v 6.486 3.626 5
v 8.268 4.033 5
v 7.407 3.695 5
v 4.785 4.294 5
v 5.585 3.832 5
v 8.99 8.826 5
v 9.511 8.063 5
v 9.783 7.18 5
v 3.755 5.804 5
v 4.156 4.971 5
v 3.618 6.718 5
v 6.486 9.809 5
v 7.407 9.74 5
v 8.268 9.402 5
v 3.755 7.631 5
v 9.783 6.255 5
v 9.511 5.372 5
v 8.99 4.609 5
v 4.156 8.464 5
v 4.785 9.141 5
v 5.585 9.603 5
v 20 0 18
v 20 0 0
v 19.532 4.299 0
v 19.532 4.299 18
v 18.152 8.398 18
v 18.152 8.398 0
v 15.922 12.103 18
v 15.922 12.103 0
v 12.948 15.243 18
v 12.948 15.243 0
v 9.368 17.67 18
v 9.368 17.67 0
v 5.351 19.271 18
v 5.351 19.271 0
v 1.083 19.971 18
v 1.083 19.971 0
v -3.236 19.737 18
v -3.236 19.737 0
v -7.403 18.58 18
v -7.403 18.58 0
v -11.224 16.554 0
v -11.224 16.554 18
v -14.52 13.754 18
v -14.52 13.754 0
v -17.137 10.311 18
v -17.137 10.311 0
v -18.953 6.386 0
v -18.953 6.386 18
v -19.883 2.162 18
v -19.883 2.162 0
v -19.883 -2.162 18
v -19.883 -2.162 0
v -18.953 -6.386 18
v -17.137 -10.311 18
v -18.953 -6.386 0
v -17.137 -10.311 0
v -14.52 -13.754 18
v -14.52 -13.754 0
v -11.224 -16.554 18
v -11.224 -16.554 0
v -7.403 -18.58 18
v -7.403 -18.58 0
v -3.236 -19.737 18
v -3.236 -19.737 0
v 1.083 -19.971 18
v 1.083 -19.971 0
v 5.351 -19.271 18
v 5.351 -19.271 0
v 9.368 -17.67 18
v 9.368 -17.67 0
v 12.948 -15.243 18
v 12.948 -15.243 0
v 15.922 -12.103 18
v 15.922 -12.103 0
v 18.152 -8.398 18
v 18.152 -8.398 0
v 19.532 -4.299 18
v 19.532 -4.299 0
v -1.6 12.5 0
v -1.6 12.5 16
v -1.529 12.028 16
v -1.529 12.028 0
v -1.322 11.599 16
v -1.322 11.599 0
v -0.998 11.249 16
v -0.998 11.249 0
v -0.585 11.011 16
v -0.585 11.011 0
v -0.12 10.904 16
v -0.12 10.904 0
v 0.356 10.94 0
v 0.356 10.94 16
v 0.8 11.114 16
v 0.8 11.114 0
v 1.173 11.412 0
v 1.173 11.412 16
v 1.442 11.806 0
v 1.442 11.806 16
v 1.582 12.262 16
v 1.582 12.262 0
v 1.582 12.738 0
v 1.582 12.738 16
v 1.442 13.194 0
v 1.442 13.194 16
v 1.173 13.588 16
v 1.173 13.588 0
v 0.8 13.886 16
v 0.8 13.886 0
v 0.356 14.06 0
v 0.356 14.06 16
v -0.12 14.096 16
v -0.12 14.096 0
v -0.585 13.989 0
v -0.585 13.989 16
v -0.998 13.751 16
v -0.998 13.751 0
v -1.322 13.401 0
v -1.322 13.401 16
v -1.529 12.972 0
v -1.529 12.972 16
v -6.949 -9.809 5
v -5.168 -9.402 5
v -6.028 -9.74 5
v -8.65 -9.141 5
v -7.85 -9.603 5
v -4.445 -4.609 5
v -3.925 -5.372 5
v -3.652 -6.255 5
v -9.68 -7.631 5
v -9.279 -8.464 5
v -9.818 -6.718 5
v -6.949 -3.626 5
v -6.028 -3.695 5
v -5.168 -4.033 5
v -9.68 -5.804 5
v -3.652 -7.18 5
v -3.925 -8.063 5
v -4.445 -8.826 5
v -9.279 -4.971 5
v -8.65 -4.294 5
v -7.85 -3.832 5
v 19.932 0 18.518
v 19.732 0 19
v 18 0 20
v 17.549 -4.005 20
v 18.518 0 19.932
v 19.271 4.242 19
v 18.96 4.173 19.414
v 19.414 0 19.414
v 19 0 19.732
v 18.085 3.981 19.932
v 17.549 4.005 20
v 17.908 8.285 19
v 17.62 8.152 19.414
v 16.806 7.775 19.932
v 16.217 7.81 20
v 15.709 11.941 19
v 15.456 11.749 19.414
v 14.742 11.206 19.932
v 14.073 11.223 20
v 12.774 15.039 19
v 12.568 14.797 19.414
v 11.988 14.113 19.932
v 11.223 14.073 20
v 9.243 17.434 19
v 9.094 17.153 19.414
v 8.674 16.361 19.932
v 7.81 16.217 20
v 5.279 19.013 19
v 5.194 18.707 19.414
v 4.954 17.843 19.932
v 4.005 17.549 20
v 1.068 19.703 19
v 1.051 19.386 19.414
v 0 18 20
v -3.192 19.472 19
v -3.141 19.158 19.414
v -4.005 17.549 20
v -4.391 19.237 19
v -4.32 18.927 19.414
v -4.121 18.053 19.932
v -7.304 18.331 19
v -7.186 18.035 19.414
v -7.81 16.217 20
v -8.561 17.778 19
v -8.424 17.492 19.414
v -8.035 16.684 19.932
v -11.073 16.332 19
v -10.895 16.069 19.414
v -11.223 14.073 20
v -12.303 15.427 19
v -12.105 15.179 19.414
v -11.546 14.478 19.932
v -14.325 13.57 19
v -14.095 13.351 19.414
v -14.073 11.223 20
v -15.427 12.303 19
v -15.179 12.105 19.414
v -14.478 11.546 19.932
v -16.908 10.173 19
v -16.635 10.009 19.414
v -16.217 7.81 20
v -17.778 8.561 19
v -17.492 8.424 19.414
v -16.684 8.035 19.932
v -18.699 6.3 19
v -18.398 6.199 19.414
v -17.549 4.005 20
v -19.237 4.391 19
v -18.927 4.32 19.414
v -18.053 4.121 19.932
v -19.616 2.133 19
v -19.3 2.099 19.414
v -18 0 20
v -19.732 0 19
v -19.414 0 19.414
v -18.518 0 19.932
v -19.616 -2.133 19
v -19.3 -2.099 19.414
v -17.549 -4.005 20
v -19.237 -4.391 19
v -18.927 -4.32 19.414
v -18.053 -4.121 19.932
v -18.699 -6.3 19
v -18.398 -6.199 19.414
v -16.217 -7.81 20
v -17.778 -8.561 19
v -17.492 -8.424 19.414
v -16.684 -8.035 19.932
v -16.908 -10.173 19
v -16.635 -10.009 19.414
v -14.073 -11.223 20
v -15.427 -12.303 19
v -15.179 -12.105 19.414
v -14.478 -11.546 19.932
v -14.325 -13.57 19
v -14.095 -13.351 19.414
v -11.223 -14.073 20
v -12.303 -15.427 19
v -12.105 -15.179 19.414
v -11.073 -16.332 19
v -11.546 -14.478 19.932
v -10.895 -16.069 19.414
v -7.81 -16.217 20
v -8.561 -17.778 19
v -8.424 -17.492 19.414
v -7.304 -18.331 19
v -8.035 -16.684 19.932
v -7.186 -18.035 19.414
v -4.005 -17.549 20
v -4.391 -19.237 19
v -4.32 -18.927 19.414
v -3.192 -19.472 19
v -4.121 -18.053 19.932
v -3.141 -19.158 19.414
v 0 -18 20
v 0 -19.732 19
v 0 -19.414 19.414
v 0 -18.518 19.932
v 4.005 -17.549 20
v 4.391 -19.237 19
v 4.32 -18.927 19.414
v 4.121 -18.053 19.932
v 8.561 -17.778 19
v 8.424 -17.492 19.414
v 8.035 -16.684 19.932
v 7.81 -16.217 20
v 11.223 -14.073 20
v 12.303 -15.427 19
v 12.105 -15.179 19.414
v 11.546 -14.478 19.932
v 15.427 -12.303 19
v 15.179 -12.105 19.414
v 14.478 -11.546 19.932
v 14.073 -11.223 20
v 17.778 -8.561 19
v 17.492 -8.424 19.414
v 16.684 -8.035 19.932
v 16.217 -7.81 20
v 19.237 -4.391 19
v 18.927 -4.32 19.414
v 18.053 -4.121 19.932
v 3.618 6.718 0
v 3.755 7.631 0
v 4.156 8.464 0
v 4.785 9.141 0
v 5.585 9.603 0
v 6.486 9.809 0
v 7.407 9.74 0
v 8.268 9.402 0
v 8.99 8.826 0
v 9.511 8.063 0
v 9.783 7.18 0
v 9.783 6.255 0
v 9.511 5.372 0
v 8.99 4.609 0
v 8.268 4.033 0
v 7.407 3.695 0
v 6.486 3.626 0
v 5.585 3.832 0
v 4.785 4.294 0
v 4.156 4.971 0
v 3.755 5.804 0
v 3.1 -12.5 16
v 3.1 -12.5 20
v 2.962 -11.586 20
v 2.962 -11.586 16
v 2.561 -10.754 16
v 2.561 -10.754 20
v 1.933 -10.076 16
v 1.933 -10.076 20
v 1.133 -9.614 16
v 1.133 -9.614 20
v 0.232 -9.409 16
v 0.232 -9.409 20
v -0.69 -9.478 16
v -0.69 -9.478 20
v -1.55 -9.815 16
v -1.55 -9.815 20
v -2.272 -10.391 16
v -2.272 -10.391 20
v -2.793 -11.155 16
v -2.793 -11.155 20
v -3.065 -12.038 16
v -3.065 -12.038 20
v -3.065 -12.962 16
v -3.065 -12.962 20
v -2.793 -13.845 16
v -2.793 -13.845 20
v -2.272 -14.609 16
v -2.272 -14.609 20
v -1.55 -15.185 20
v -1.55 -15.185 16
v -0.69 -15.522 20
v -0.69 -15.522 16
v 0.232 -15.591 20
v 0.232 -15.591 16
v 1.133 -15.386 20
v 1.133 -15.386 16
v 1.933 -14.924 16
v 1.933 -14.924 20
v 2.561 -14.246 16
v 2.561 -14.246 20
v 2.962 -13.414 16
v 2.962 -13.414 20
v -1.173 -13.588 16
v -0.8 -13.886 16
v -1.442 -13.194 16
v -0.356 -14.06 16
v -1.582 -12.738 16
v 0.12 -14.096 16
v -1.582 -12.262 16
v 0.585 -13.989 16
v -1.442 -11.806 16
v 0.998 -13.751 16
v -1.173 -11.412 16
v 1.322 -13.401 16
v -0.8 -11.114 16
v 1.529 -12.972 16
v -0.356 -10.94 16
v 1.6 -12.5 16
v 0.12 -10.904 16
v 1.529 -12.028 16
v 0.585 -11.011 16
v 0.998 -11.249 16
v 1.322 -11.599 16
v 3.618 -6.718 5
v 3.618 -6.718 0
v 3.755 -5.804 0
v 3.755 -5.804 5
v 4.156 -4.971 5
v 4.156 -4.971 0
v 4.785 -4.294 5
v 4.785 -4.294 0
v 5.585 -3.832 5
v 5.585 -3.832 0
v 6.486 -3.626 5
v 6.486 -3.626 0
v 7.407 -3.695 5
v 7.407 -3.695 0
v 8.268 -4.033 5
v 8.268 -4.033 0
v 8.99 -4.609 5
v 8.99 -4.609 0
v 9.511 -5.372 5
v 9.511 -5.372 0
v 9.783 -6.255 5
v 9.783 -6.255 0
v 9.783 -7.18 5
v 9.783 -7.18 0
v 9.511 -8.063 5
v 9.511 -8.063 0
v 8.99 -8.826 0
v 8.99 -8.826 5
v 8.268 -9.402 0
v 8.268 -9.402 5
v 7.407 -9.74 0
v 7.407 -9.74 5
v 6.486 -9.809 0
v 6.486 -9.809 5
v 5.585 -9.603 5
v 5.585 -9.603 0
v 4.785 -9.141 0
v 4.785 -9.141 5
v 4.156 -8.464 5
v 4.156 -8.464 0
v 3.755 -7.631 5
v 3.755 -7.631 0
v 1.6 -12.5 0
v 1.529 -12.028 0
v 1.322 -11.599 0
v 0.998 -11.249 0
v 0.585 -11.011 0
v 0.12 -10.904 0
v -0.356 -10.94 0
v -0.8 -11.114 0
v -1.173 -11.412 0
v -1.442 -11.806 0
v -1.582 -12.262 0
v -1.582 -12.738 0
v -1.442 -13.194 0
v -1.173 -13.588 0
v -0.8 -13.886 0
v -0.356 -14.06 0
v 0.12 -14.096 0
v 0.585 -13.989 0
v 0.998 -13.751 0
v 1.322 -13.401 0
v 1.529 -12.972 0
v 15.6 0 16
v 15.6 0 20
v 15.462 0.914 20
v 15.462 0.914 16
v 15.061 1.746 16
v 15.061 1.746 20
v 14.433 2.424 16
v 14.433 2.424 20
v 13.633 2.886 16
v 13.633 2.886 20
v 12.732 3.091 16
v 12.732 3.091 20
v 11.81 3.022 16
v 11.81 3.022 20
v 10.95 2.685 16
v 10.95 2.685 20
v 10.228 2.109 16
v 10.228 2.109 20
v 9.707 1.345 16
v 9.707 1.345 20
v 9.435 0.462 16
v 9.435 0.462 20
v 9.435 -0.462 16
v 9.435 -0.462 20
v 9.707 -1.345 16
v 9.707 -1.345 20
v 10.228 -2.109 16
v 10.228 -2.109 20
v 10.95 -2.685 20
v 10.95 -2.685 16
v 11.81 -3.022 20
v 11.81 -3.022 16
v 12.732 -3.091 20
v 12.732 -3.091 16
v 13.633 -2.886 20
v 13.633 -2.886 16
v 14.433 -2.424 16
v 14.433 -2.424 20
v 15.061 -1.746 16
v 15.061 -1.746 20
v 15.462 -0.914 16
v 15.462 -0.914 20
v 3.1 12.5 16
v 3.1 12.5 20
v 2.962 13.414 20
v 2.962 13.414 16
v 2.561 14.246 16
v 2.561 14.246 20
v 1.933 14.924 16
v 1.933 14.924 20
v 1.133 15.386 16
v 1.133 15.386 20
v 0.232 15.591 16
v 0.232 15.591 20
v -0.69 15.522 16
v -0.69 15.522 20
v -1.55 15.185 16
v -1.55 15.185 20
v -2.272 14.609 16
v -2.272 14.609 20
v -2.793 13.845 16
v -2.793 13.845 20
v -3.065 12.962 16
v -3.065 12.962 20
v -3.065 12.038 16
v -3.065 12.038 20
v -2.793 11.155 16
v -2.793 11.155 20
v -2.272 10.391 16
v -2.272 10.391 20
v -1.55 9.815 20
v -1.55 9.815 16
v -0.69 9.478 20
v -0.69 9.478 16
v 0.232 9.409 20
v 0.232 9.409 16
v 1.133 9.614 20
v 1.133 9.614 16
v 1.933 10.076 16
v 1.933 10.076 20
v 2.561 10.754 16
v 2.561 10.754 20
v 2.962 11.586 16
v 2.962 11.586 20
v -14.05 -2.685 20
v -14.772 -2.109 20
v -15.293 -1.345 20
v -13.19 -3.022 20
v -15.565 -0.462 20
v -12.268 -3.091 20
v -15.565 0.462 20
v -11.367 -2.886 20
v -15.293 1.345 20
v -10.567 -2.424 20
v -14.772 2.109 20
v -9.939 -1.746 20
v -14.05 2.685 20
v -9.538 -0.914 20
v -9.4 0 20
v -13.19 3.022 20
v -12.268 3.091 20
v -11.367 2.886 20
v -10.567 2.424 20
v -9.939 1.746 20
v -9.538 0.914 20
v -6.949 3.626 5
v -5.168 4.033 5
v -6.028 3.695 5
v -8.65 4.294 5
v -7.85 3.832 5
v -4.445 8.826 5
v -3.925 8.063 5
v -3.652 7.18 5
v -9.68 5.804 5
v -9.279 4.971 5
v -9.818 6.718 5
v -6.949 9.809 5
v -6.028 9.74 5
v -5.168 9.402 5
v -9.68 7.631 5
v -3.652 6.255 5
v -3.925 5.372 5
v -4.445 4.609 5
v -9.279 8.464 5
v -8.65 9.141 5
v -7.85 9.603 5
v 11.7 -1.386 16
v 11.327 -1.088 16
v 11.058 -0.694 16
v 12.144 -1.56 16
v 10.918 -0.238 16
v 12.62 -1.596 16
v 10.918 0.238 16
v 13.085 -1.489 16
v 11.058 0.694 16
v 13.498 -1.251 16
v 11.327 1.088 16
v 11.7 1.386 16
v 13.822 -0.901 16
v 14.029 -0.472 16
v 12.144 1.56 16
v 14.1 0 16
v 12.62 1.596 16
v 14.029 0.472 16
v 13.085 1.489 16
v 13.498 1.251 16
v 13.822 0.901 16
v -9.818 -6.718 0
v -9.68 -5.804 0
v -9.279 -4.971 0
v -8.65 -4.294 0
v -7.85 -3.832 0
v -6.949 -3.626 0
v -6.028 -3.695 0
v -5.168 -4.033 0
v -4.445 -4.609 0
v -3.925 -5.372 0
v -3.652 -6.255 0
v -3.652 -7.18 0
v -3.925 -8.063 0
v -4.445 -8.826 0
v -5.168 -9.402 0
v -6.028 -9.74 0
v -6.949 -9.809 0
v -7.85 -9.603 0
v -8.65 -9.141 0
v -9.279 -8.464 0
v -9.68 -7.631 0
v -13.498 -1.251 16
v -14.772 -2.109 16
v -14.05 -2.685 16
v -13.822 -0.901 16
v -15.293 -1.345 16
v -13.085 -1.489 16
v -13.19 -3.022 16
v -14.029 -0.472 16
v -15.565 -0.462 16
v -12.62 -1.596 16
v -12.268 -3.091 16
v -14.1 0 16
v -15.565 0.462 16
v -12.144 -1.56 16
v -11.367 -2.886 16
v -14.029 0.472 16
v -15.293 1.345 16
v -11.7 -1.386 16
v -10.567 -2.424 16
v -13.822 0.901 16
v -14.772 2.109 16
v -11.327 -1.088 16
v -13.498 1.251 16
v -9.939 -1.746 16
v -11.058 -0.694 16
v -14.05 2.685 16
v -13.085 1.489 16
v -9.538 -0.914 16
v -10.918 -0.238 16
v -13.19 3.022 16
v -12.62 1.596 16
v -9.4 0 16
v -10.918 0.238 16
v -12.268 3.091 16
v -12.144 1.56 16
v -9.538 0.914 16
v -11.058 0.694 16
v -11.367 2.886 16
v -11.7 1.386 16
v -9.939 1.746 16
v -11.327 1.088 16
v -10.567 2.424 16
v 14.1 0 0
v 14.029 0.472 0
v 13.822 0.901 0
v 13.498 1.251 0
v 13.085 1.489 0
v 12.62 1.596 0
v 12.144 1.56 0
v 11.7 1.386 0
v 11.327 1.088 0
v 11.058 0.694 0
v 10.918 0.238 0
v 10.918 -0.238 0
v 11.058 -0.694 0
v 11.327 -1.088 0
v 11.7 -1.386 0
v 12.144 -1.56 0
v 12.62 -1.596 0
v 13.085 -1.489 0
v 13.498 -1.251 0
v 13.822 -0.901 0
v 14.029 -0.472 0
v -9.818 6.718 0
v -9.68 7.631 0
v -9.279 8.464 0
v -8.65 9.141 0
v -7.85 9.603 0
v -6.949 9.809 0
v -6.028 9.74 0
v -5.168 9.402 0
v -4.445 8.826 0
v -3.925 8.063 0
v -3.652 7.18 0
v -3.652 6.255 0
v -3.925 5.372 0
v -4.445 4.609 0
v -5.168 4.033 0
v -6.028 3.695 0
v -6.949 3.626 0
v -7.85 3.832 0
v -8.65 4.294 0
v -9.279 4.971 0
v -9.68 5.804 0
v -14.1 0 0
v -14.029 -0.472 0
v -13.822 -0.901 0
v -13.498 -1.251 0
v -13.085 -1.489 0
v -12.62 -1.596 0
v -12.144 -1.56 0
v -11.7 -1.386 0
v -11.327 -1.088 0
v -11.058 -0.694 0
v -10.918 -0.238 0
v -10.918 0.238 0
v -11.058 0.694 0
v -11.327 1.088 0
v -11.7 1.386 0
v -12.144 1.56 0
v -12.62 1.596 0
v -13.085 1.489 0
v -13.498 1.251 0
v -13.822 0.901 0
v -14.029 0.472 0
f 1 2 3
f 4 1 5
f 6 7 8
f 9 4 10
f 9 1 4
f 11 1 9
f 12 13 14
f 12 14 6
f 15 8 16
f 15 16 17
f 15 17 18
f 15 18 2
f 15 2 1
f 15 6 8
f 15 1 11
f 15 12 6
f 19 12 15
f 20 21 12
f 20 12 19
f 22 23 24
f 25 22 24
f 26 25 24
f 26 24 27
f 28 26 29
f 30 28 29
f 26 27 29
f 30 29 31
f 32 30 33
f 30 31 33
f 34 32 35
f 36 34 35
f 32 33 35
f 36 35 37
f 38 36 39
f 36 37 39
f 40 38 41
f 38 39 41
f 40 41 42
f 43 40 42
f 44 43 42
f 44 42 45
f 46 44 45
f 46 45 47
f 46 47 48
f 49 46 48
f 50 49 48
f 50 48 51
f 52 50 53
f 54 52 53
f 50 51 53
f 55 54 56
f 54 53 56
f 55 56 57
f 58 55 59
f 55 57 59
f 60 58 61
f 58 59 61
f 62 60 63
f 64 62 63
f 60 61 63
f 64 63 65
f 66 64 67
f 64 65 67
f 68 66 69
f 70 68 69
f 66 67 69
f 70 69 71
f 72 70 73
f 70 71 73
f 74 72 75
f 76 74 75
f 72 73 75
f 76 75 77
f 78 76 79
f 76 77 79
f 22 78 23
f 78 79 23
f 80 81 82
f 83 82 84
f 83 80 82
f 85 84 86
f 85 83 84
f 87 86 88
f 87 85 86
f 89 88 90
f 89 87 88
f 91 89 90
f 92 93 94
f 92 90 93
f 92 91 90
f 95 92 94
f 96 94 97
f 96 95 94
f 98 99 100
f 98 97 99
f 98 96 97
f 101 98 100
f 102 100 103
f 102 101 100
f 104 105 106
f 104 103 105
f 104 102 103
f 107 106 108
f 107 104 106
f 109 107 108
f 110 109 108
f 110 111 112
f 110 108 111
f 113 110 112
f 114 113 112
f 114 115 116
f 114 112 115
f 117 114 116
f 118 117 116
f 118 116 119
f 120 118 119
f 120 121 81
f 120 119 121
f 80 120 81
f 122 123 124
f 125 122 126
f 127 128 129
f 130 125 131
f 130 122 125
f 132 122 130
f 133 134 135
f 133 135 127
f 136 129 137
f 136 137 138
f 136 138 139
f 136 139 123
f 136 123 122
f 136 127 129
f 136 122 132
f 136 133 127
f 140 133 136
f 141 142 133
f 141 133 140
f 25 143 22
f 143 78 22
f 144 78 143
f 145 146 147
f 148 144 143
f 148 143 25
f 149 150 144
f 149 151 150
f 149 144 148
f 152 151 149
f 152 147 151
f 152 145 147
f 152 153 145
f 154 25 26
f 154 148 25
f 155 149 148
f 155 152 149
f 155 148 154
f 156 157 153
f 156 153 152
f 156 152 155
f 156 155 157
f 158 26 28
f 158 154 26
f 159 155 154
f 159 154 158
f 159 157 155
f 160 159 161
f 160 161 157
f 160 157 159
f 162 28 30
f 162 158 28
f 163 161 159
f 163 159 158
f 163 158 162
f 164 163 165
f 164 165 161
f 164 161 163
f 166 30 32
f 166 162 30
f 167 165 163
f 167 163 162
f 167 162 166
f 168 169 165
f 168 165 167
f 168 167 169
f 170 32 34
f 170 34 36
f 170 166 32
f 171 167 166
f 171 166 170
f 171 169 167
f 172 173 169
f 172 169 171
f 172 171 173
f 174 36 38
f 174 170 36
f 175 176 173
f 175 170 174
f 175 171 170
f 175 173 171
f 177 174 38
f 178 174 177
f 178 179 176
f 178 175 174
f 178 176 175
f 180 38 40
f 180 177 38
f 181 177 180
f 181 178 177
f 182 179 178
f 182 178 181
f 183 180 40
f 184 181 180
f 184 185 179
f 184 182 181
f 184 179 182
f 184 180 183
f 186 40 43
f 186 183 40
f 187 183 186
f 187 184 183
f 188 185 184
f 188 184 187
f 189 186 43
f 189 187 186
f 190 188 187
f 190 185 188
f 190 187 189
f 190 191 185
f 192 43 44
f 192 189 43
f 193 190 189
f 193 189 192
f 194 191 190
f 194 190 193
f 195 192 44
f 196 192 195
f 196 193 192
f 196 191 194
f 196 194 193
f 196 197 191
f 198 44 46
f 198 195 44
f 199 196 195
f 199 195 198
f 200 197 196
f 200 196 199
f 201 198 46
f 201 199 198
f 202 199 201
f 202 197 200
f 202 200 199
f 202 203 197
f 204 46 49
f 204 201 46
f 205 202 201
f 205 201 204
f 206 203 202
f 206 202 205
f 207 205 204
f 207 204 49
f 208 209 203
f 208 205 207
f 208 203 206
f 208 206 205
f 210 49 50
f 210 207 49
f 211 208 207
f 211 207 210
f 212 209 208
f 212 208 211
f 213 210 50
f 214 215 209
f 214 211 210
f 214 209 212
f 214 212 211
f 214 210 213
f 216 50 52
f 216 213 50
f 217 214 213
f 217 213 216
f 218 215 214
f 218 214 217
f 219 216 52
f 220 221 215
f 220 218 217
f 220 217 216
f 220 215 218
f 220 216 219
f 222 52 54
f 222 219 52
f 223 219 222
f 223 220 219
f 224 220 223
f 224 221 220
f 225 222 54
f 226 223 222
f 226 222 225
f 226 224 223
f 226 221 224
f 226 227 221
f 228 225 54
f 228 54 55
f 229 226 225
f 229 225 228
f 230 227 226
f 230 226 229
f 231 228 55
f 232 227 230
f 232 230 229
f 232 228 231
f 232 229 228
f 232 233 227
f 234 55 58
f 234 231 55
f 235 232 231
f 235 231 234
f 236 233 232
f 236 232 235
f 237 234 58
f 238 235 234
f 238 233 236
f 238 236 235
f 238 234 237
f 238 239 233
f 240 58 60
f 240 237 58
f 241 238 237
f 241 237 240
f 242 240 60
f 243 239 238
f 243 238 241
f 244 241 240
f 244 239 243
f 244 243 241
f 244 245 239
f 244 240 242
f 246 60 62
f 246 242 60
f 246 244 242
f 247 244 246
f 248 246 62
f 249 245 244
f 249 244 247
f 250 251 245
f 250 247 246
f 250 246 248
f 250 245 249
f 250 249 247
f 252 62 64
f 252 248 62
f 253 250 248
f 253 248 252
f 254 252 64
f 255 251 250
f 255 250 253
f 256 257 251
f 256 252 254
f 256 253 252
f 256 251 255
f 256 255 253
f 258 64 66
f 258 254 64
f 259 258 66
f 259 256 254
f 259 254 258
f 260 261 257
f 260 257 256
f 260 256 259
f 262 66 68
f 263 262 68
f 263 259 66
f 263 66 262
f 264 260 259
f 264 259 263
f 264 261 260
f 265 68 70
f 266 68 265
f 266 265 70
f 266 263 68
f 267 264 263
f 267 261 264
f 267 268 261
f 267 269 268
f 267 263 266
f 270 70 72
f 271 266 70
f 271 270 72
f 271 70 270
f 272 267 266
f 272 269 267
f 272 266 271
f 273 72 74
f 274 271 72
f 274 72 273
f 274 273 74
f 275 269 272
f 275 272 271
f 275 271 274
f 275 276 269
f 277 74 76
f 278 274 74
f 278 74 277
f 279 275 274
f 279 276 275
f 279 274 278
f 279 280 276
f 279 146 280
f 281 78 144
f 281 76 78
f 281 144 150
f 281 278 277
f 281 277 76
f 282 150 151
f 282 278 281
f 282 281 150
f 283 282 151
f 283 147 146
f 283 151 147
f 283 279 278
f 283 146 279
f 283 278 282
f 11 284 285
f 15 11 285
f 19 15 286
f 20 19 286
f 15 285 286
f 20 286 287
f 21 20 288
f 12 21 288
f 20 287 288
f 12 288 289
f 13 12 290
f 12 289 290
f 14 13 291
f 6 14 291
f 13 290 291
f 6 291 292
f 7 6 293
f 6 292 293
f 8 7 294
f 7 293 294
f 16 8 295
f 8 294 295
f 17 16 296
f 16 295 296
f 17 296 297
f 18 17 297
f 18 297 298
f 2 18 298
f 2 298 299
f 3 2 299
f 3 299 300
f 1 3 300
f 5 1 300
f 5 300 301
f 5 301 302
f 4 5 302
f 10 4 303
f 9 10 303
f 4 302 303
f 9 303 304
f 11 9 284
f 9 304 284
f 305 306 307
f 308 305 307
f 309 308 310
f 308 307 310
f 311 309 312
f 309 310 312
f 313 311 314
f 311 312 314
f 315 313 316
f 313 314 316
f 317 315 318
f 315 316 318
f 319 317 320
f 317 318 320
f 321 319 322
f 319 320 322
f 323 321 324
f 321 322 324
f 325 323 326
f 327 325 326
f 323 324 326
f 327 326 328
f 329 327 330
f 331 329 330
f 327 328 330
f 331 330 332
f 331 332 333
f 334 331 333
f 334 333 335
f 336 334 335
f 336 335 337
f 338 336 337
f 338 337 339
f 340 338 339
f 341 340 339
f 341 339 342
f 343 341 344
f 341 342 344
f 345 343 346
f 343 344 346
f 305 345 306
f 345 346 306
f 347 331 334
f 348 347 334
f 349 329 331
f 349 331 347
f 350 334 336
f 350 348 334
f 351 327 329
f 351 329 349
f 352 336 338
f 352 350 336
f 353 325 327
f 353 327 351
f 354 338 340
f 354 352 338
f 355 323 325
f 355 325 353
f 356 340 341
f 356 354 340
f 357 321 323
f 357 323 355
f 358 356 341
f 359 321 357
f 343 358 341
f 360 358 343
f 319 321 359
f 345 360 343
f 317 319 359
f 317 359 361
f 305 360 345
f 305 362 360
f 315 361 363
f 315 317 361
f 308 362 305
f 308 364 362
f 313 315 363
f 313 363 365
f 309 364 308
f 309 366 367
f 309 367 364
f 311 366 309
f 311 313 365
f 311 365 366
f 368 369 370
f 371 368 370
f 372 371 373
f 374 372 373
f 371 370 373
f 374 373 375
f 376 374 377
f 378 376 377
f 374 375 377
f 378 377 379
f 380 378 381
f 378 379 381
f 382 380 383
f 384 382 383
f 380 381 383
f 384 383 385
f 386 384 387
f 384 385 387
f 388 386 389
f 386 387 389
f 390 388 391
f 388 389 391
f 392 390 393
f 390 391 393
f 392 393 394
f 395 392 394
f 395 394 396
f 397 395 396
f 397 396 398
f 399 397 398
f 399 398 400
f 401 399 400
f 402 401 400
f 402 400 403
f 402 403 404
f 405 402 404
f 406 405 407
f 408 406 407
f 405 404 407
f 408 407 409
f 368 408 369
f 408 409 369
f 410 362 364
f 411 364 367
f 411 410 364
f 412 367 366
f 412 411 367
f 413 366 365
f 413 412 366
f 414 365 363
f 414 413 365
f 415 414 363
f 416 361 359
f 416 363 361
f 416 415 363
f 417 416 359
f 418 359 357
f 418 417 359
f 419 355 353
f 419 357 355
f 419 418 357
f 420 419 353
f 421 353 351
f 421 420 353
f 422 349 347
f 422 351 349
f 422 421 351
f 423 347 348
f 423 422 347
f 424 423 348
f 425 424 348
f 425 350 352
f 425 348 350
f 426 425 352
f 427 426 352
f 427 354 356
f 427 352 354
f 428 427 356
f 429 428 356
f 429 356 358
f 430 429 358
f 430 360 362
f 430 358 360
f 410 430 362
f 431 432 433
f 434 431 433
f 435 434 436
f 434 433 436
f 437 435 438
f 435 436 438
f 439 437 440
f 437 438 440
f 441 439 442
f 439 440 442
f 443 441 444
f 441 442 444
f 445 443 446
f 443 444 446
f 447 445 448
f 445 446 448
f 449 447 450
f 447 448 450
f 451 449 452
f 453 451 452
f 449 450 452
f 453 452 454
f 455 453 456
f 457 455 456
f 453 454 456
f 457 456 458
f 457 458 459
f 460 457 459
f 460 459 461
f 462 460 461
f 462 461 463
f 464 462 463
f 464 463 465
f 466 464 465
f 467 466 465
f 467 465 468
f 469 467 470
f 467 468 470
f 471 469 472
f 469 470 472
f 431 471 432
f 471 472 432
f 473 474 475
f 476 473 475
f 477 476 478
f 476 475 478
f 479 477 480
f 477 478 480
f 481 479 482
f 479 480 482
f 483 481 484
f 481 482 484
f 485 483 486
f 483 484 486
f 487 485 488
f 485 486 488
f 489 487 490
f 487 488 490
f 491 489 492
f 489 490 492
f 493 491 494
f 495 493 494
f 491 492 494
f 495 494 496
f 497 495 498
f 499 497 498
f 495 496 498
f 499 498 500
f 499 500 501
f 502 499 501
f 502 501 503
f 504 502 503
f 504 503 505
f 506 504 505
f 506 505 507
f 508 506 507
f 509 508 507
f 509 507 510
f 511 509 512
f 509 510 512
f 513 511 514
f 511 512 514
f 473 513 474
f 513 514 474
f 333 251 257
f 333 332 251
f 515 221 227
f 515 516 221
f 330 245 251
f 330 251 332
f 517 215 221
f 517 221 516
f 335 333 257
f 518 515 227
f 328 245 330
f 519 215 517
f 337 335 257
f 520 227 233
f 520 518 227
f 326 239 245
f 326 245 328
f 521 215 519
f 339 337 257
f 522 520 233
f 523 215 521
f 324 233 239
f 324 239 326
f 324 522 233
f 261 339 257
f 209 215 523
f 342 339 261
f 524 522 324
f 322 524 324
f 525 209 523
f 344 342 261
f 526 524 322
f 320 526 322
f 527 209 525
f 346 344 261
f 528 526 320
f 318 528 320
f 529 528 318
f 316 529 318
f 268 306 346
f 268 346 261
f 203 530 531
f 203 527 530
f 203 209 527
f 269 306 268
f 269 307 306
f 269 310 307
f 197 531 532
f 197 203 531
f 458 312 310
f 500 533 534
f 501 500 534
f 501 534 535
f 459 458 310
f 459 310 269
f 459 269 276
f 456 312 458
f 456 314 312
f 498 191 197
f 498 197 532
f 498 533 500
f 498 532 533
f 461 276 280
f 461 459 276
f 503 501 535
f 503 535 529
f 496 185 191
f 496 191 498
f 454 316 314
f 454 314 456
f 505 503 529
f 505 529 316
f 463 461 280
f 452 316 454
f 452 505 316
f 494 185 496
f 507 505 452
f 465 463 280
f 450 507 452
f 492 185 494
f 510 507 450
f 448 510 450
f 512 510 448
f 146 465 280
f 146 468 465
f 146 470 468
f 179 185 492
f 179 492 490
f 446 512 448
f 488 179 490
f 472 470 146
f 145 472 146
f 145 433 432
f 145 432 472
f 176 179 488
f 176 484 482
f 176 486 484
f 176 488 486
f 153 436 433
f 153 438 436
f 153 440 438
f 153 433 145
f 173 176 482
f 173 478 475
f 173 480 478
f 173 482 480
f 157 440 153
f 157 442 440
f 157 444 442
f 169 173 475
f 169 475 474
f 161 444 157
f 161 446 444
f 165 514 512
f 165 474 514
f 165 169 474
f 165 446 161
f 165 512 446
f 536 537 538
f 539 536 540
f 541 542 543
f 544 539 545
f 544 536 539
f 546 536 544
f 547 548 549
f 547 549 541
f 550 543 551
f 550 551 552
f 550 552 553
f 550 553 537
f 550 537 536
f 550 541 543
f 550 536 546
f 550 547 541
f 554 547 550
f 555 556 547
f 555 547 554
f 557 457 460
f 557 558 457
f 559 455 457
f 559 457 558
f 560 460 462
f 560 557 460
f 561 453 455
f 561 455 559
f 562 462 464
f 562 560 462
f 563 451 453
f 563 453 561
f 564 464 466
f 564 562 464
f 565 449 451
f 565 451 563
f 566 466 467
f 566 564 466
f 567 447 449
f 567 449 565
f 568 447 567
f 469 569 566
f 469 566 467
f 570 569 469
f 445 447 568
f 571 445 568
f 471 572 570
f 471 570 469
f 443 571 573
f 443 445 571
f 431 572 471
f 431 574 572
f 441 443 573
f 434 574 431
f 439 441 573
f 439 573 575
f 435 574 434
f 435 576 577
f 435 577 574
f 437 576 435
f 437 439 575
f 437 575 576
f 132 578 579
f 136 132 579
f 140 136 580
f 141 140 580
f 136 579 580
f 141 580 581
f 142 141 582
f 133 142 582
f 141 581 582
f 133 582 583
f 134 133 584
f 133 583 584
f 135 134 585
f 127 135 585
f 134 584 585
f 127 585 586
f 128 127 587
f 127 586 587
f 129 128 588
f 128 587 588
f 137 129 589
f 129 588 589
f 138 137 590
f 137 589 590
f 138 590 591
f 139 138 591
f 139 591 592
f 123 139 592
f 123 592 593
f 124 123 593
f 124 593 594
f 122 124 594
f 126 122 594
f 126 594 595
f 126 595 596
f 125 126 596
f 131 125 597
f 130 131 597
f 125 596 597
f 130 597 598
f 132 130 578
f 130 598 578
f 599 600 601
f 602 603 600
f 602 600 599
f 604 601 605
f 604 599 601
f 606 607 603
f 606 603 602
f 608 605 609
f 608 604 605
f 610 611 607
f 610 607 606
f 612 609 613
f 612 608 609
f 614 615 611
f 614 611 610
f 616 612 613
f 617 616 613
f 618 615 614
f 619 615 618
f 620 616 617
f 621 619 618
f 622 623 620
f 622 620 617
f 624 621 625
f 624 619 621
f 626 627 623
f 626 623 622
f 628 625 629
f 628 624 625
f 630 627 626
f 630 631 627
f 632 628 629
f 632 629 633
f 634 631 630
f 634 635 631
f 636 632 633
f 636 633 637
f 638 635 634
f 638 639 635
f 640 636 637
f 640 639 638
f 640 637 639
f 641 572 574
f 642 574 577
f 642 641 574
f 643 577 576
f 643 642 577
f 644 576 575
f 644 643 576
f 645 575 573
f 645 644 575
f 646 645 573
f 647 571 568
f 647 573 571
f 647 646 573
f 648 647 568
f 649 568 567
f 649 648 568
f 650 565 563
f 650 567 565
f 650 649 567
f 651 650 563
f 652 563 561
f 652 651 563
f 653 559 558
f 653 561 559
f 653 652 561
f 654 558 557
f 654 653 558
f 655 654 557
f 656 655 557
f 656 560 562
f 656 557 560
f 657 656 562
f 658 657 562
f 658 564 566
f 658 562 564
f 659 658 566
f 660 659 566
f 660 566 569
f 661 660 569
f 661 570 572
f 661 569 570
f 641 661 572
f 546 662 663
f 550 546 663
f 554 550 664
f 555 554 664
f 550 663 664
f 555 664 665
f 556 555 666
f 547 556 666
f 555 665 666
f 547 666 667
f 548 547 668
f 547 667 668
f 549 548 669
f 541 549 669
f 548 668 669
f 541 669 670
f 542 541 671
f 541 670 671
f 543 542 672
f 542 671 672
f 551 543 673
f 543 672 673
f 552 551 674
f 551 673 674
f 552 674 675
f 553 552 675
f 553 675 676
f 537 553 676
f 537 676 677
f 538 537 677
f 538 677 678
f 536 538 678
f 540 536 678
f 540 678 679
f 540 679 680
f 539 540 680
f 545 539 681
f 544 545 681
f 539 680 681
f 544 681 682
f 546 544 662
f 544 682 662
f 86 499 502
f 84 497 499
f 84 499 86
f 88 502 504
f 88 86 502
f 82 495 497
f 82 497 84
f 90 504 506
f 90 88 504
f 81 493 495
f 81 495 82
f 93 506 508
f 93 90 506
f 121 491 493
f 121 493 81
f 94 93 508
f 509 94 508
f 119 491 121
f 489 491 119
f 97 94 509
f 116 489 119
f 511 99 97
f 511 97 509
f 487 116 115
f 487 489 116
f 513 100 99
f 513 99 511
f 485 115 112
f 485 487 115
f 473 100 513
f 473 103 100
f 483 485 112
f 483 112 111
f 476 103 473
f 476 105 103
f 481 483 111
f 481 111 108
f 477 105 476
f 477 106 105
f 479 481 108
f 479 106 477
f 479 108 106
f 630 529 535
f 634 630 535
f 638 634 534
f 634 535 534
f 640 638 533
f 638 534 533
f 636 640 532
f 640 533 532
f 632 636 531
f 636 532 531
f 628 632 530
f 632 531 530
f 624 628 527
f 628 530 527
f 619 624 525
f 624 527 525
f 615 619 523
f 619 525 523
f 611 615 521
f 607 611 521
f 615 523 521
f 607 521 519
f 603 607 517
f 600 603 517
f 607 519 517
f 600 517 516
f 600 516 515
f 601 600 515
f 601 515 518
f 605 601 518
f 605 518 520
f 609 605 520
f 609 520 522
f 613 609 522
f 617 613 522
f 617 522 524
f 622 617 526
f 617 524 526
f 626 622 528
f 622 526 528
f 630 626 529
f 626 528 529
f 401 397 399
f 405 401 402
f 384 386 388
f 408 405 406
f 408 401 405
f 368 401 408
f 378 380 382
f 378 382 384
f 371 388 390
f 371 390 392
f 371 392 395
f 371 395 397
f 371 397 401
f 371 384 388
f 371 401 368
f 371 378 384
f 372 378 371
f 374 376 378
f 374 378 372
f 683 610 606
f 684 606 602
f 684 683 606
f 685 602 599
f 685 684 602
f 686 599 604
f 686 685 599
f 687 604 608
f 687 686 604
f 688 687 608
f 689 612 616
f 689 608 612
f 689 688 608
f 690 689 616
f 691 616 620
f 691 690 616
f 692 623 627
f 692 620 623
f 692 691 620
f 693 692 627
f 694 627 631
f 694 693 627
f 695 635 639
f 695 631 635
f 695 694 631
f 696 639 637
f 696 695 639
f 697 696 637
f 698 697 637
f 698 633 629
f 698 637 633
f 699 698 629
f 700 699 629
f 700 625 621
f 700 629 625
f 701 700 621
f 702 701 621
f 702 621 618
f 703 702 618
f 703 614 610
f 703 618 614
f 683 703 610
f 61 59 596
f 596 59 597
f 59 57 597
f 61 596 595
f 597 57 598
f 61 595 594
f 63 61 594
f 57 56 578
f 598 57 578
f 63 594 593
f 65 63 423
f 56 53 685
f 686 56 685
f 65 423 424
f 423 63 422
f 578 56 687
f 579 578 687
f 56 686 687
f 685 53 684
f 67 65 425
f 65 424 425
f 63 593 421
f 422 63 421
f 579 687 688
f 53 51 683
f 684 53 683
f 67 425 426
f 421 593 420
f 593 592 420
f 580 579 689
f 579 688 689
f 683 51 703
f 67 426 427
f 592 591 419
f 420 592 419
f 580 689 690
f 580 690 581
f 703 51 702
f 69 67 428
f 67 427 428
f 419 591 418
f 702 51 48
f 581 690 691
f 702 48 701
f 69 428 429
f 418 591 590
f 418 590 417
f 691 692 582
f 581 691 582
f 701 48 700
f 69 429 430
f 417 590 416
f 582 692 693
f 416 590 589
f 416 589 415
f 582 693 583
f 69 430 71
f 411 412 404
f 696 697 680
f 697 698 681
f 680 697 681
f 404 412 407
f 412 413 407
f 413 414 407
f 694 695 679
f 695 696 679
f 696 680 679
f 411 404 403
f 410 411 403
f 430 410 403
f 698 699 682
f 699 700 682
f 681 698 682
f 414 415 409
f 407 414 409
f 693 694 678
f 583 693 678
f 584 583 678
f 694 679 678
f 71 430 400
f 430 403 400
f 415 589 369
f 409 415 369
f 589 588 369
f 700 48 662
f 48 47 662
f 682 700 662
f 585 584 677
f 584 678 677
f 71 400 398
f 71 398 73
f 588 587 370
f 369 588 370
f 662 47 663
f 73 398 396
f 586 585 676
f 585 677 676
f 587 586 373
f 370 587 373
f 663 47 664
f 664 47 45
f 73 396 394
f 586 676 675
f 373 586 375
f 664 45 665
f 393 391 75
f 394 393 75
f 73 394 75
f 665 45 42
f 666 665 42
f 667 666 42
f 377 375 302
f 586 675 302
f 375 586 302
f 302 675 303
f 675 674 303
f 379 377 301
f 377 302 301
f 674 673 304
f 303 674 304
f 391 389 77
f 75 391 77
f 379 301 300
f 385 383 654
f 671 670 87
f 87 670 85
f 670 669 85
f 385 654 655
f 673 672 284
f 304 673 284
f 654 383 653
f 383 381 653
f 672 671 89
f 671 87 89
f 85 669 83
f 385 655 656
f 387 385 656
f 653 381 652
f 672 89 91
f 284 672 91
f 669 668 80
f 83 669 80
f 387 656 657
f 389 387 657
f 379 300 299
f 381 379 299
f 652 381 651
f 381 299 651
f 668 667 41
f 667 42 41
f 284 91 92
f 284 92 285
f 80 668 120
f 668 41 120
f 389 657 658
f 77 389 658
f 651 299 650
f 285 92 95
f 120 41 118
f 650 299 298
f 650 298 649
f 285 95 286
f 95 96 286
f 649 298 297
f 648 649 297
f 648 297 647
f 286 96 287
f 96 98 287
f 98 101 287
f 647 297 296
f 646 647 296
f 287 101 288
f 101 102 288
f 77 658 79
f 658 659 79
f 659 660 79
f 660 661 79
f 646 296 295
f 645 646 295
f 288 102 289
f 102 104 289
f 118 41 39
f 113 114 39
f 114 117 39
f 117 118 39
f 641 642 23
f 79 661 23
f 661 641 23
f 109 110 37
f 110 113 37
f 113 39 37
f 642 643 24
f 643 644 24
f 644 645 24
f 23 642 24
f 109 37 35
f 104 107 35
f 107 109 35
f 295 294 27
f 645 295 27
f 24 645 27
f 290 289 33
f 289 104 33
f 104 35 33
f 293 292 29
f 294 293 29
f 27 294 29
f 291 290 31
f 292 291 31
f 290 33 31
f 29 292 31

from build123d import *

# Parameters (mm, degrees)
SKETCH_1_R          = 20
SKETCH_1_R_2        = 1.6
EXTRUDE_1_DEPTH     = 20
SKETCH_2_R          = 3.1
CUT_EXTRUDE_1_DEPTH = 4
SKETCH_3_R          = 3.1
CUT_EXTRUDE_2_DEPTH = 5
FILLET_1_R          = 2


with BuildPart() as part:
    # 草图1 → 凸台-拉伸1 (new body)
    with BuildSketch(Plane.XY):
        Circle(SKETCH_1_R)
        with Locations((12.5, 0)):
            Circle(SKETCH_1_R_2, mode=Mode.SUBTRACT)
        with Locations((0, -12.5)):
            Circle(SKETCH_1_R_2, mode=Mode.SUBTRACT)
        with Locations(Location((-12.5, 0, 0), (0, 0, 180))):
            Circle(SKETCH_1_R_2, mode=Mode.SUBTRACT)
        with Locations(Location((0, 12.5, 0), (0, 0, 180))):
            Circle(SKETCH_1_R_2, mode=Mode.SUBTRACT)
    extrude(amount=EXTRUDE_1_DEPTH)

    # 草图2 → 切除-拉伸1 (cut)
    with BuildSketch(Plane.XY.offset(20)):
        with Locations((-12.5, 0)):
            Circle(SKETCH_2_R)
        with Locations((0, -12.5)):
            Circle(SKETCH_2_R)
        with Locations((12.5, 0)):
            Circle(SKETCH_2_R)
        with Locations((0, 12.5)):
            Circle(SKETCH_2_R)
    extrude(amount=-CUT_EXTRUDE_1_DEPTH, mode=Mode.SUBTRACT)

    # 草图3 → 切除-拉伸2 (cut)
    with BuildSketch(Plane(origin=(0, 0, 0), x_dir=(-1, 0, 0), z_dir=(0, 0, -1))):
        with Locations((-6.717514421, 6.717514421)):
            Circle(SKETCH_3_R)
        with Locations((6.717514421, 6.717514421)):
            Circle(SKETCH_3_R)
        with Locations((6.717514421, -6.717514421)):
            Circle(SKETCH_3_R)
        with Locations((-6.717514421, -6.717514421)):
            Circle(SKETCH_3_R)
    extrude(amount=-CUT_EXTRUDE_2_DEPTH, mode=Mode.SUBTRACT)

    # 圆角1
    fillet_1_edges = [part.edges().sort_by_distance(p)[0] for p in [
        (-20, 0, 20),
    ]]
    fillet(fillet_1_edges, radius=FILLET_1_R)


solid = part.part
